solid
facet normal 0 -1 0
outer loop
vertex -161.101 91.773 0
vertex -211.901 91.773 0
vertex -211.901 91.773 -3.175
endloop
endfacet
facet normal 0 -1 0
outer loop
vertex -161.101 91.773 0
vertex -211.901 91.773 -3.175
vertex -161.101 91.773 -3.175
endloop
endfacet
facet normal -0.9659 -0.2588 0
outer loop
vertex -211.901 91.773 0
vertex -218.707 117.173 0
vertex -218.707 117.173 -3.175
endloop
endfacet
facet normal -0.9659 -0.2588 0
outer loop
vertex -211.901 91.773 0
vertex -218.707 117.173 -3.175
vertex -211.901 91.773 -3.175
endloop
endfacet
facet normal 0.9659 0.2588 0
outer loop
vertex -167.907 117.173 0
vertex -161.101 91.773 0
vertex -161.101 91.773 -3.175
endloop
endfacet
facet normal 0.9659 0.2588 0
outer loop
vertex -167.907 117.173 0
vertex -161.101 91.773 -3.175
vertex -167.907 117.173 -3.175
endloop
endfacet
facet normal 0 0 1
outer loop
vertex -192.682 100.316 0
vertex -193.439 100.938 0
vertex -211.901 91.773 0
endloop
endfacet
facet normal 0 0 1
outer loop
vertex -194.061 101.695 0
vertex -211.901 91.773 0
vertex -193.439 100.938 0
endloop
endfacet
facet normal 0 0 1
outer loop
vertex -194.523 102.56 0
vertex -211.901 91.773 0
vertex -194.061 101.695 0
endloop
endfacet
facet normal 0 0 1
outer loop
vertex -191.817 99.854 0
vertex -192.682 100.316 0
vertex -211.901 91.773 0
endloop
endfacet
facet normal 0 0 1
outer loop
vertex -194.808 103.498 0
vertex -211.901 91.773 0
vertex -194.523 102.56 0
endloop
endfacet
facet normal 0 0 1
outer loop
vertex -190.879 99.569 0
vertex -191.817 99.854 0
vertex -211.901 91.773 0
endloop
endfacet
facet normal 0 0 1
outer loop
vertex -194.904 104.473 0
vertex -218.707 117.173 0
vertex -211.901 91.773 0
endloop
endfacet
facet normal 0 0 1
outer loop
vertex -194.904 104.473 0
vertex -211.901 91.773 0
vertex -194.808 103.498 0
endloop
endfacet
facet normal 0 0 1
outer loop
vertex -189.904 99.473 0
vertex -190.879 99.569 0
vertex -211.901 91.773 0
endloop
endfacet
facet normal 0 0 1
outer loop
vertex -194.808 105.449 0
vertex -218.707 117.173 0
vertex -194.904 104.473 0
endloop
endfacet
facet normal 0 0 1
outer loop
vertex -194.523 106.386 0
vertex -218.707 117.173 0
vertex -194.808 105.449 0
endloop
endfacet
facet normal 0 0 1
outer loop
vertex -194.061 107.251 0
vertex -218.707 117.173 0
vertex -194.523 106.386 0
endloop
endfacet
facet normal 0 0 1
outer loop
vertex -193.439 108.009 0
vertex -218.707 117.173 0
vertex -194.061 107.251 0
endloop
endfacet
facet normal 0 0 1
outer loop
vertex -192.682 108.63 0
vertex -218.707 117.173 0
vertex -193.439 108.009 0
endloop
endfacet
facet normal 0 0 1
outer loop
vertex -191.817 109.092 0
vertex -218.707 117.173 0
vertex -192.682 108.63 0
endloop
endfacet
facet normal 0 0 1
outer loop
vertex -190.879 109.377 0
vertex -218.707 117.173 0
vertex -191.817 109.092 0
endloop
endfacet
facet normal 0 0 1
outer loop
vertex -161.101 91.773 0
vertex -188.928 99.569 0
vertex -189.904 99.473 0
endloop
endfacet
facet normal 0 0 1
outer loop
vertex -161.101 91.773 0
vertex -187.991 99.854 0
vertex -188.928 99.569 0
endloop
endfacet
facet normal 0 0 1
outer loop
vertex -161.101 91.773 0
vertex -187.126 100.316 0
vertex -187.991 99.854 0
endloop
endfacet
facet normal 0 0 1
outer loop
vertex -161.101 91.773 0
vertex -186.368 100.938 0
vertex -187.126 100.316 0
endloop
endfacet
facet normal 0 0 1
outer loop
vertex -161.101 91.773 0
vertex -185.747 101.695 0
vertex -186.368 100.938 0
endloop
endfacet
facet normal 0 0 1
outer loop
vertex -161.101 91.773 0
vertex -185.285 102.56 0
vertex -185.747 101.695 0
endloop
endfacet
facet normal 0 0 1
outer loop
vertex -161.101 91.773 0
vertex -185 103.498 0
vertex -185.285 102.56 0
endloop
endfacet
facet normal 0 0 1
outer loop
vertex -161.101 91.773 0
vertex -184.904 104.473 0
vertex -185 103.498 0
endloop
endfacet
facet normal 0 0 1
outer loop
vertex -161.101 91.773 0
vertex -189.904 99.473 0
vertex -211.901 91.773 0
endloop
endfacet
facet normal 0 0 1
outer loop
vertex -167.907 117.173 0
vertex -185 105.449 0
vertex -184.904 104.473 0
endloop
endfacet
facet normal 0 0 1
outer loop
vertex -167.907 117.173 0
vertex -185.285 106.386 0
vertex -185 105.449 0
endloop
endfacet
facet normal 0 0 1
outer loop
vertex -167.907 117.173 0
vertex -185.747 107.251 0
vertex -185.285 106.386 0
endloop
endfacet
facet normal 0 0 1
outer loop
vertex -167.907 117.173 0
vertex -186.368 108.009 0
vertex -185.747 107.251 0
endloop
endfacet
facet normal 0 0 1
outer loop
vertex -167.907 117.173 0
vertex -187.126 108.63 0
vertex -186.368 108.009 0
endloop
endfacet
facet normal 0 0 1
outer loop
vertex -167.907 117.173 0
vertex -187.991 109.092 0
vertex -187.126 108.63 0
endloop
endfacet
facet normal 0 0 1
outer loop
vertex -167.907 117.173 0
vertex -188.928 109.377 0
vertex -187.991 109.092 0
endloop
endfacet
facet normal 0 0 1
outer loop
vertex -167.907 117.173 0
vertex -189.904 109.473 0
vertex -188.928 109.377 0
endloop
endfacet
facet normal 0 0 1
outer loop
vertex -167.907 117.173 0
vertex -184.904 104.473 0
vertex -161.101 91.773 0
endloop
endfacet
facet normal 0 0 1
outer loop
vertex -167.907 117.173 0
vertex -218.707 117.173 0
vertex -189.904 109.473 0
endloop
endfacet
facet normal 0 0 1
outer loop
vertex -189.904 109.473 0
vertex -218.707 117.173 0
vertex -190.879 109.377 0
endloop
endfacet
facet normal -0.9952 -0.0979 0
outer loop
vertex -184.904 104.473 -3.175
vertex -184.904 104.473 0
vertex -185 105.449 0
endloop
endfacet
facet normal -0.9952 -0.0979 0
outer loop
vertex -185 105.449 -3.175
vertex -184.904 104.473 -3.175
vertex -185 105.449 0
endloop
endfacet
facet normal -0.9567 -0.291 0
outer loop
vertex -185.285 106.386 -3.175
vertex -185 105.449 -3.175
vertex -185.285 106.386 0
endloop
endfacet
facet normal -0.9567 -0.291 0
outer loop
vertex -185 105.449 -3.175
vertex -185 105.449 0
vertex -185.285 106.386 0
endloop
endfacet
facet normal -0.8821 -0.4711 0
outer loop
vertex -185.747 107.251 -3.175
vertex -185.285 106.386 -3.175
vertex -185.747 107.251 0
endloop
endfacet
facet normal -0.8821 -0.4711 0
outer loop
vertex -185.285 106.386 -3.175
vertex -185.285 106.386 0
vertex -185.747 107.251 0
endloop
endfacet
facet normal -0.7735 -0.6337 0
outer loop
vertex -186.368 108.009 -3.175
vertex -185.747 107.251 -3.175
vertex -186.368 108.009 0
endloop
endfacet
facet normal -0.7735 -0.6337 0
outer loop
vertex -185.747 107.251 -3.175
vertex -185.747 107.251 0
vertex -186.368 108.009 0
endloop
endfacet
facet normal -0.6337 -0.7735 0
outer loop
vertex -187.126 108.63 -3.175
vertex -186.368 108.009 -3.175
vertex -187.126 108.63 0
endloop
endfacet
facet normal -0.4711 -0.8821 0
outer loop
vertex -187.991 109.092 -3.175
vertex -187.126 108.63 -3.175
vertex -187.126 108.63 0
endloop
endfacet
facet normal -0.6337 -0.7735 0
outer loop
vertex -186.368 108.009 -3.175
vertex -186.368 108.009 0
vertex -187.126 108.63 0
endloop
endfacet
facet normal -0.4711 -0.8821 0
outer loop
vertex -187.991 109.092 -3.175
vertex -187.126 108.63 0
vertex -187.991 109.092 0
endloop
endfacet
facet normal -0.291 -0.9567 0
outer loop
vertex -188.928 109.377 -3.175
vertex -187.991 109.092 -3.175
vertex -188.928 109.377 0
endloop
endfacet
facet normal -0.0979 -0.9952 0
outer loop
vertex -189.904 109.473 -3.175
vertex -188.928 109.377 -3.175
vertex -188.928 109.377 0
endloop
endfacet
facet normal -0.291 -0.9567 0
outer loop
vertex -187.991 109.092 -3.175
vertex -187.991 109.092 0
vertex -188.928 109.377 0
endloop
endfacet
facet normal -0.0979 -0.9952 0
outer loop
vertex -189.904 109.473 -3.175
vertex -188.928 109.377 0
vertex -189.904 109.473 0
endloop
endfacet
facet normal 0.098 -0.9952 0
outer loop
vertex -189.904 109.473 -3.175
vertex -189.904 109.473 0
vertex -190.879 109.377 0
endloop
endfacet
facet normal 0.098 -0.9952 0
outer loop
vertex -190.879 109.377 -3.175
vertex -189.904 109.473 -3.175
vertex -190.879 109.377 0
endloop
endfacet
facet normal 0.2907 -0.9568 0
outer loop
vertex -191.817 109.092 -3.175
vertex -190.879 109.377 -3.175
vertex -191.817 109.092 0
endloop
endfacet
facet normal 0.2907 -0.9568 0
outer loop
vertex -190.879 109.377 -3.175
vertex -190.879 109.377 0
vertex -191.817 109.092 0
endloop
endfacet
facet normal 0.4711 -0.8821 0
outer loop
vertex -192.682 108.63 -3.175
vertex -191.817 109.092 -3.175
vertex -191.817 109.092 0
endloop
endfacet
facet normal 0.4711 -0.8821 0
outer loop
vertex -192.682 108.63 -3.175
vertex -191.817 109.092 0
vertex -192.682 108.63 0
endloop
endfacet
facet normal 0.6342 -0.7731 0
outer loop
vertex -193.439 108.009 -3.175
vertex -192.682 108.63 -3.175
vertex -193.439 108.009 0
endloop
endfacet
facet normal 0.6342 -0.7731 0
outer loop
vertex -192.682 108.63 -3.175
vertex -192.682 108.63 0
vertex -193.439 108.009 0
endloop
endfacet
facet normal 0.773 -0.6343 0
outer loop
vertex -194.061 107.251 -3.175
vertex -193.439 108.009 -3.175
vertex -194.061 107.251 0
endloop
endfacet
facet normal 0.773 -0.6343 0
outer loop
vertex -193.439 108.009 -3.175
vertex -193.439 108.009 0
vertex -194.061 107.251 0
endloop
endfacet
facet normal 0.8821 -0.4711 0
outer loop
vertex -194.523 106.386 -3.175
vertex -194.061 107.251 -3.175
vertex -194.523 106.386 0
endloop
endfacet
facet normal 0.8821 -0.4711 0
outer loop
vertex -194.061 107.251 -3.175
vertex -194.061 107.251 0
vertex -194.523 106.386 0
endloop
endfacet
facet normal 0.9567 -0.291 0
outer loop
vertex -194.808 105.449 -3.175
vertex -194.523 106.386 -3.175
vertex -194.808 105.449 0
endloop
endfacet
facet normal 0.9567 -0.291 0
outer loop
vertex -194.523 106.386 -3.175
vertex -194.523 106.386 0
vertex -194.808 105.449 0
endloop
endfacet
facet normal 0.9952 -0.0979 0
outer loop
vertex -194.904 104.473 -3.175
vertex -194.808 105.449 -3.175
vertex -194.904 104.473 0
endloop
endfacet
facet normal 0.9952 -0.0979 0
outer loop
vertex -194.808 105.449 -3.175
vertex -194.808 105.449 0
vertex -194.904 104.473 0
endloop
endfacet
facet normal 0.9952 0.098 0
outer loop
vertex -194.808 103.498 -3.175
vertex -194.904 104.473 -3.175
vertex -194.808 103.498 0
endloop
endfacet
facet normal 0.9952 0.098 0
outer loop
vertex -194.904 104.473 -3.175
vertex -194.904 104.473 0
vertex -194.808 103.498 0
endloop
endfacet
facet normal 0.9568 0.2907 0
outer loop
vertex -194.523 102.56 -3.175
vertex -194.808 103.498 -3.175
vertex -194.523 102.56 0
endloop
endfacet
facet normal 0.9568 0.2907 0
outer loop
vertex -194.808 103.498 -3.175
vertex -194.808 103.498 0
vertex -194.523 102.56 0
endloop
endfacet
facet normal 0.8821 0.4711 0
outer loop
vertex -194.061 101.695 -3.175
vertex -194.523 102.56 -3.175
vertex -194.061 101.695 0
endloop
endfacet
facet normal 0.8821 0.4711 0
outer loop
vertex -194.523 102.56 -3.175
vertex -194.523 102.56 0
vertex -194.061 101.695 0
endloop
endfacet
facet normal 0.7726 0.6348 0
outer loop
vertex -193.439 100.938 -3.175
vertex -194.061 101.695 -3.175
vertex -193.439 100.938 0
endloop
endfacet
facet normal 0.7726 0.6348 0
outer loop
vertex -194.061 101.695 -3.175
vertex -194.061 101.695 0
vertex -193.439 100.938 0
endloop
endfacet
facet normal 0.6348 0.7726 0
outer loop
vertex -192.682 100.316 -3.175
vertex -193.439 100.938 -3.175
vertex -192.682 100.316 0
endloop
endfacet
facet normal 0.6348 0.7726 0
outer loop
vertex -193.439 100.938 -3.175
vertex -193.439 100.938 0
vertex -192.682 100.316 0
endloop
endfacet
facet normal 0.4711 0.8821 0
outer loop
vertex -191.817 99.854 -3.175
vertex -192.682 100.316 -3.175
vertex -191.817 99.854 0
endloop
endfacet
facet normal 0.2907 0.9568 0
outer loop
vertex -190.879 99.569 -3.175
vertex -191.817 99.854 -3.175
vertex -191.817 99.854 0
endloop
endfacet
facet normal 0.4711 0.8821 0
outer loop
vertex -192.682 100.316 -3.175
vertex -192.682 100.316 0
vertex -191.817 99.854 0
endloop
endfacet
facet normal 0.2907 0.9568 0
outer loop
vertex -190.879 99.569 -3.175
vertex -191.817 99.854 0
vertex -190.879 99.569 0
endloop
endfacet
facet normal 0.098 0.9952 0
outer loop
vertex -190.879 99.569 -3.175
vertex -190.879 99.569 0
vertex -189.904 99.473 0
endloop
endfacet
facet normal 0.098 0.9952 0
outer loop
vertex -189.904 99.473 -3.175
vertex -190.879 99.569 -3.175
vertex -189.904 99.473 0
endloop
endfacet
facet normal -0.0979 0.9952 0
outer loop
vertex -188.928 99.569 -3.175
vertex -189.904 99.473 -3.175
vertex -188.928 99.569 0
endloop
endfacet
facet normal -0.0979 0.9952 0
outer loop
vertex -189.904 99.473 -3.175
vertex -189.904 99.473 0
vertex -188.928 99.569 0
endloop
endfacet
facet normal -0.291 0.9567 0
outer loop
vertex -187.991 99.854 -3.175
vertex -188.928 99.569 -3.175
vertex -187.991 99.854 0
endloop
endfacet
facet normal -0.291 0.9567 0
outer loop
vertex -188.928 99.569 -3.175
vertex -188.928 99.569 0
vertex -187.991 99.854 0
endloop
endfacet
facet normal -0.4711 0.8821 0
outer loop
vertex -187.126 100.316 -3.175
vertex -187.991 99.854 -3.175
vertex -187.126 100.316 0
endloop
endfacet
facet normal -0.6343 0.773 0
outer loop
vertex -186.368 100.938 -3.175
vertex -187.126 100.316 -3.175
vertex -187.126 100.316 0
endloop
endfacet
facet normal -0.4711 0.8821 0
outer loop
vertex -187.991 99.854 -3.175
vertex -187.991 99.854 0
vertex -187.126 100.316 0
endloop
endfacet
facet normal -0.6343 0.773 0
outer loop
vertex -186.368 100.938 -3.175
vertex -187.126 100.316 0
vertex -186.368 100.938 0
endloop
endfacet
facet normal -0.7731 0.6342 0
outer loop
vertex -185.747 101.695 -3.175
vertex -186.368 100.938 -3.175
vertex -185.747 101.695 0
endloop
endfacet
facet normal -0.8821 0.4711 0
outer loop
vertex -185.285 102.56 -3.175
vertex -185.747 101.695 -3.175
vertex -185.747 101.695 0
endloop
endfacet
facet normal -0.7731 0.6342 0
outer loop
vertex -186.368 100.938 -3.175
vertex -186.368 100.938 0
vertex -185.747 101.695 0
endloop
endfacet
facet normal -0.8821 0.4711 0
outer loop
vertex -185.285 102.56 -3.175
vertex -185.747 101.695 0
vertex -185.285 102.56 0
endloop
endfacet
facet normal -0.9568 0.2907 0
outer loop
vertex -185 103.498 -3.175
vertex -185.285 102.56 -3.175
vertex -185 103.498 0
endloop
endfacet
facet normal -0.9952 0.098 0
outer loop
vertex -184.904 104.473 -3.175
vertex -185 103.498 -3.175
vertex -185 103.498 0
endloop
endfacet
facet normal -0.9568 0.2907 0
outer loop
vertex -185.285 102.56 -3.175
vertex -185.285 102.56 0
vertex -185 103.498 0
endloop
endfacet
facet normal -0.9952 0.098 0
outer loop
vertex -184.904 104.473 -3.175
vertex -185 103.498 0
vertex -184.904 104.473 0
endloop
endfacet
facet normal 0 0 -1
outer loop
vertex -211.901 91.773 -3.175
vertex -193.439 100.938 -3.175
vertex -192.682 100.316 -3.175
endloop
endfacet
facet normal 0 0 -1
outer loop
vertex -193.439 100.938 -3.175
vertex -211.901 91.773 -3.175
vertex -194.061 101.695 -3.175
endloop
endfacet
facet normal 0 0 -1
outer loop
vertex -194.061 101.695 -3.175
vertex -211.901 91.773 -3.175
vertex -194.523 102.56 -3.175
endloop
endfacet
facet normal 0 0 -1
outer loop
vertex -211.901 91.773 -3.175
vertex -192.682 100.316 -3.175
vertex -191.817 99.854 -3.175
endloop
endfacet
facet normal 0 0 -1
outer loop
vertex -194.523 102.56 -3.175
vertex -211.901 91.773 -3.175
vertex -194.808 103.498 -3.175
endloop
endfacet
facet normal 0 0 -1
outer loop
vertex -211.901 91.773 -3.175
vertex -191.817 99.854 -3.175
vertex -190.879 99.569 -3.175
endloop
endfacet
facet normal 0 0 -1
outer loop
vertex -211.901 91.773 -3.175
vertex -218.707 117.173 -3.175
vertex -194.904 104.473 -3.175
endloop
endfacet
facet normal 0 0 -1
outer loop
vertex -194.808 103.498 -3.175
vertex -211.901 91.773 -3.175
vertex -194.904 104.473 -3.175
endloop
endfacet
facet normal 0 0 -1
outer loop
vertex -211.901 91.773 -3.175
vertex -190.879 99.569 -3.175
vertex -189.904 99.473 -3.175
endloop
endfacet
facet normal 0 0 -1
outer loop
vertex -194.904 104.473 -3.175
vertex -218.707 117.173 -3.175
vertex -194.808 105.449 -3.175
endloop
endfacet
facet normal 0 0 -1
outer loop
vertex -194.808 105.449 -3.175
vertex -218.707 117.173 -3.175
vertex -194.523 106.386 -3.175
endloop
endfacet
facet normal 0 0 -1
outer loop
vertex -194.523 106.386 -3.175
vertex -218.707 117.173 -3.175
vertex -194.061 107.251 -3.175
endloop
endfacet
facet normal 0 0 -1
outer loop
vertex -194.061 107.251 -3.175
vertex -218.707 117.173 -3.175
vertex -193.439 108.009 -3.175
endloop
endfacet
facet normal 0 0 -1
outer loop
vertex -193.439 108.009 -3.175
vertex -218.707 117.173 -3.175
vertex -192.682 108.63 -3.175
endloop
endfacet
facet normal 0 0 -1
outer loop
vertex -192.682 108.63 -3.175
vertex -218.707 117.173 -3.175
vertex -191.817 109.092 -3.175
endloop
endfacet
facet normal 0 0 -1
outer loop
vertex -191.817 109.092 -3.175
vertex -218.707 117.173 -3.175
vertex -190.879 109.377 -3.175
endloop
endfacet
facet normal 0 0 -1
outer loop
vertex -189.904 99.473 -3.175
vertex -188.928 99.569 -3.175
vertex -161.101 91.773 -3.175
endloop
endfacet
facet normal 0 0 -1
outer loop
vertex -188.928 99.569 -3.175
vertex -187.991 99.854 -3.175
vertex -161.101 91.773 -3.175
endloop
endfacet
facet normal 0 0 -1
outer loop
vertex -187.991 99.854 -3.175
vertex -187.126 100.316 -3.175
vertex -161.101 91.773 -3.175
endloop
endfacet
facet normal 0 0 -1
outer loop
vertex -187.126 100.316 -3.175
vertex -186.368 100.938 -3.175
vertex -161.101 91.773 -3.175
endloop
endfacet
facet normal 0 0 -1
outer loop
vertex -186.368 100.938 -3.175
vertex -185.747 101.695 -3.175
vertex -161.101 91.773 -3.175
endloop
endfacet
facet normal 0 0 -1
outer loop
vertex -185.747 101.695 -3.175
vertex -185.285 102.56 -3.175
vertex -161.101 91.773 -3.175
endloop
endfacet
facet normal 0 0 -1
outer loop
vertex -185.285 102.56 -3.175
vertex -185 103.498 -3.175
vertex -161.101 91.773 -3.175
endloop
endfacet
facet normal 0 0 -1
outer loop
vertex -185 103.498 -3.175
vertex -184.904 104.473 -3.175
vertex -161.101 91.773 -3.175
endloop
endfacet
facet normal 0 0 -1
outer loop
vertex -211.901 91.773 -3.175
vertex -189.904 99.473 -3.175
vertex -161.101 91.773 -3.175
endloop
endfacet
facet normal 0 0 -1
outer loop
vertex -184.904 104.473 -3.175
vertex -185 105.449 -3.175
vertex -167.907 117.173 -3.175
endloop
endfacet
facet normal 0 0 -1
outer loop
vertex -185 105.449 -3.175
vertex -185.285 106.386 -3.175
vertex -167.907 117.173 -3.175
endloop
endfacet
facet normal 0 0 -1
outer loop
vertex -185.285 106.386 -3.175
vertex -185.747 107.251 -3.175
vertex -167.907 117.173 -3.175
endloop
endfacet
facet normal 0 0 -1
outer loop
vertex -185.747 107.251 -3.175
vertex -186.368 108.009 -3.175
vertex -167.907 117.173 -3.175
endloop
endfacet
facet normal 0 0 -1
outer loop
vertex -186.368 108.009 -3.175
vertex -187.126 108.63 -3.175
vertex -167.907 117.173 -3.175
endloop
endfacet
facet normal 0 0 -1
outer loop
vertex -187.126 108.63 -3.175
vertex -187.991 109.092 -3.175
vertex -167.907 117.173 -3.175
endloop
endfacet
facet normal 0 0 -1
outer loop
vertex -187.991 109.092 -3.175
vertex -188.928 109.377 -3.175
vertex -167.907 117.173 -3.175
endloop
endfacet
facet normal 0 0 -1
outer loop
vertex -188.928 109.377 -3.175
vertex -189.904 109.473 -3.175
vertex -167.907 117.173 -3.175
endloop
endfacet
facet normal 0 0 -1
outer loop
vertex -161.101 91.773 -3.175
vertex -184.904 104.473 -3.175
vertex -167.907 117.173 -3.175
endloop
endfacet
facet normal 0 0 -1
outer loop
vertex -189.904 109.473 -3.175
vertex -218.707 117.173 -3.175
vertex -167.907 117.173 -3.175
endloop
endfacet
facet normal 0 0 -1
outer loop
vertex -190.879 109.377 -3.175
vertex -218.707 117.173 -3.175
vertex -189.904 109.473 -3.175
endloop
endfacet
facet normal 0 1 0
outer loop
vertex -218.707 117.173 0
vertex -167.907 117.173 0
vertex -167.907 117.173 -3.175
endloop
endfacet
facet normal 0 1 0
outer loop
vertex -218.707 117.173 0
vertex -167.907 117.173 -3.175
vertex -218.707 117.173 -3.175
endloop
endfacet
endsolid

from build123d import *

# Parameters (mm, degrees)
SKETCH1_R           = 5
BOSS_EXTRUDE1_DEPTH = 3.175


with BuildPart() as part:
    # Sketch1 → Boss-Extrude1 (new body)
    with BuildSketch(Plane.XY):
        Polygon((-218.70690504, 117.173081746), (-211.900995552, 91.773081746), (-161.100995552, 91.773081746), (-167.90690504, 117.173081746), align=None)
        with Locations((-189.903950296, 104.473081746)):
            Circle(SKETCH1_R, mode=Mode.SUBTRACT)
    extrude(amount=-BOSS_EXTRUDE1_DEPTH)


solid = part.part
